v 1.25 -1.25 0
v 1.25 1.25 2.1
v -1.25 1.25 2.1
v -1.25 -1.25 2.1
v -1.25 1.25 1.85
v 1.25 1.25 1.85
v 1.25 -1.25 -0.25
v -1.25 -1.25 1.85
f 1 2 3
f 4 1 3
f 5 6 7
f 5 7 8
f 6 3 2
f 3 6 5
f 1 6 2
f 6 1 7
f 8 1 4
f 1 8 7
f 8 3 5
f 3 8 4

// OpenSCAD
// file: lib/lodge_kit.scad
// Lodge shell tile kit — shared dimensions and modules.
//
// The game paints a lodge footprint in 5 m cells and resolves the
// exterior from these tiles at half-cell (2.5 m) resolution; see
// internal/world/lodge_shell.go. Every tile is authored in the same
// canonical frame:
//
//   * origin on the lodge floor plane (Z = 0);
//   * wall-type tiles sit on a footprint edge, centred on it, with the
//     OUTSIDE toward SCAD −Y (game +Z) and the wall thickness toward +Y;
//   * roof tiles are centred on a half-cell, with Z = 0 at the tile's
//     lowest corner; slopes fall toward −Y (game +Z);
//   * corner tiles sit on a grid vertex; an outer corner's building is
//     in the SCAD (−X, +Y) quadrant, an inner corner's notch in (+X, −Y).
//
// Colours are near-neutral: the renderer tints walls and roofs per lodge
// from a seeded palette (world.ShellPalette).
//
// Keep these in sync with the constants in lodge_shell.go.

tile   = 2.5;   // ShellTileSize
wall_h = 5.0;   // ShellWallHeight
rise   = 2.1;   // ShellRoofRise, per tile of run
pitch  = rise / tile;

wall_t   = 0.35;  // wall thickness
sink     = 1.5;   // walls run this far below the floor to hide pad grading
roof_t   = 0.25;  // roof slab thickness
overhang = 0.7;   // eaves overhang past the wall plane

c_wall   = [0.92, 0.90, 0.86];
c_stone  = [0.62, 0.61, 0.60];
c_trim   = [0.97, 0.97, 0.95];
c_glass  = [0.30, 0.42, 0.52];
c_door   = [0.36, 0.25, 0.18];
c_roof   = [0.97, 0.97, 0.97];
c_fascia = [0.55, 0.52, 0.50];

// Plain wall panel: timber above a stone plinth, a trim band under the
// eaves.
module wall_panel() {
    color(c_wall)
        translate([-tile/2, 0, -sink]) cube([tile, wall_t, wall_h + sink]);
    color(c_stone)
        translate([-tile/2, -0.06, -sink]) cube([tile, wall_t, sink + 0.7]);
    color(c_trim)
        translate([-tile/2, -0.04, wall_h - 0.3]) cube([tile, 0.1, 0.3]);
    battens();
}

// Horizontal board lines above the plinth.
module battens() {
    color(c_wall * 0.8)
        for (z = [1.3 : 0.6 : wall_h - 0.6])
            translate([-tile/2, -0.03, z]) cube([tile, 0.04, 0.06]);
}

// A framed pane on the outer face. x0/w along the wall, z0/h up it.
module pane(x0, w, z0, h) {
    color(c_trim)
        translate([x0 - 0.1, -0.05, z0 - 0.1]) cube([w + 0.2, 0.06, h + 0.2]);
    color(c_glass)
        translate([x0, -0.08, z0]) cube([w, 0.06, h]);
}

module wall_window() {
    wall_panel();
    pane(-0.7, 1.4, 1.4, 2.2);
    color(c_trim) translate([-0.02, -0.1, 1.4]) cube([0.04, 0.04, 2.2]); // mullion
}

// Tall window flanked by shutters.
module wall_window_alt() {
    wall_panel();
    pane(-0.5, 1.0, 1.2, 2.8);
    color(c_door) {
        translate([-1.0, -0.1, 1.2]) cube([0.4, 0.05, 2.8]);
        translate([ 0.6, -0.1, 1.2]) cube([0.4, 0.05, 2.8]);
    }
}

// Floor-to-eave glazing for food courts: a low stone sill, then glass in
// three lights.
module wall_glazed() {
    color(c_wall)
        translate([-tile/2, 0, -sink]) cube([tile, wall_t, wall_h + sink]);
    color(c_stone)
        translate([-tile/2, -0.06, -sink]) cube([tile, wall_t, sink + 0.35]);
    color(c_glass)
        translate([-tile/2, -0.09, 0.35]) cube([tile, 0.06, wall_h - 0.75]);
    color(c_trim) {
        for (x = [-tile/2, -tile/6, tile/6, tile/2 - 0.08])
            translate([x, -0.12, 0.35]) cube([0.08, 0.06, wall_h - 0.75]);
        translate([-tile/2, -0.12, wall_h - 0.45]) cube([tile, 0.07, 0.1]);
    }
}

// Glazed entry door under a small canopy, with a step.
module door() {
    color(c_wall)
        translate([-tile/2, 0, -sink]) cube([tile, wall_t, wall_h + sink]);
    color(c_stone)
        translate([-tile/2, -0.06, -sink]) cube([tile, wall_t, sink + 0.15]);
    battens();
    color(c_door)
        translate([-0.9, -0.1, 0]) cube([1.8, 0.1, 2.7]);
    color(c_glass) {
        translate([-0.75, -0.13, 0.9]) cube([0.65, 0.05, 1.6]);
        translate([ 0.10, -0.13, 0.9]) cube([0.65, 0.05, 1.6]);
    }
    color(c_trim)
        translate([-tile/2, -0.04, wall_h - 0.3]) cube([tile, 0.1, 0.3]);
    color(c_roof)   // canopy
        translate([-1.2, -1.3, 3.0])
            rotate([-12, 0, 0]) cube([2.4, 1.3, 0.12]);
    color(c_stone)  // step
        translate([-1.1, -0.9, -0.3]) cube([2.2, 0.9, 0.42]);
}

module corner_outer() {
    color(c_stone)
        translate([-0.3, -0.05, -sink]) cube([0.35, 0.35, wall_h + sink - 0.3]);
}

module corner_inner() {
    color(c_trim)
        translate([0, -0.12, 0]) cube([0.12, 0.12, wall_h - 0.3]);
}

// Roof slab over one half-cell. h lists corner heights (in rise units)
// in SCAD order (−X,+Y), (+X,+Y), (+X,−Y), (−X,−Y); split names which
// diagonal the top surface folds along: 0 through corners 0–2, 1
// through corners 1–3.
module roof_tile(h, split) {
    p = [[-tile/2, tile/2], [tile/2, tile/2], [tile/2, -tile/2], [-tile/2, -tile/2]];
    top = [for (i = [0:3]) [p[i][0], p[i][1], h[i] * rise]];
    bot = [for (i = [0:3]) [p[i][0], p[i][1], h[i] * rise - roof_t]];
    tris = split == 0 ? [[0, 1, 2], [0, 2, 3]] : [[0, 1, 3], [1, 2, 3]];
    color(c_roof)
        polyhedron(
            points = concat(top, bot),
            faces = concat(
                // top (clockwise seen from above = outward in OpenSCAD)
                [for (t = tris) [t[0], t[1], t[2]]],
                [for (t = tris) [t[2] + 4, t[1] + 4, t[0] + 4]],
                [for (i = [0:3]) [i, i + 4, (i + 1) % 4 + 4, (i + 1) % 4]]
            ));
}

// Eaves strip past a wall edge: continues the roof plane outward and
// down, finished with a fascia board.
module eave() {
    drop = overhang * pitch;
    color(c_roof)
        polyhedron(
            points = [
                [-tile/2, 0, 0], [tile/2, 0, 0], [tile/2, -overhang, -drop], [-tile/2, -overhang, -drop],
                [-tile/2, 0, -roof_t], [tile/2, 0, -roof_t], [tile/2, -overhang, -drop - roof_t], [-tile/2, -overhang, -drop - roof_t],
            ],
            faces = [[0, 1, 2, 3], [7, 6, 5, 4], [0, 4, 5, 1], [1, 5, 6, 2], [2, 6, 7, 3], [3, 7, 4, 0]]);
    color(c_fascia)
        translate([-tile/2, -overhang - 0.05, -drop - roof_t - 0.1]) cube([tile, 0.08, roof_t + 0.2]);
}

// Eaves in the square past an outer corner: a hip folding along the
// diagonal away from the building.
module eave_corner() {
    o = overhang;
    d = o * pitch;
    color(c_roof)
        polyhedron(
            points = [
                [0, 0, 0], [o, 0, -d], [o, -o, -d], [0, -o, -d],
                [0, 0, -roof_t], [o, 0, -d - roof_t], [o, -o, -d - roof_t], [0, -o, -d - roof_t],
            ],
            faces = [[0, 1, 2], [0, 2, 3], [6, 5, 4], [7, 6, 4], [0, 4, 5, 1], [1, 5, 6, 2], [2, 6, 7, 3], [3, 7, 4, 0]]);
    color(c_fascia) {
        translate([0, -o - 0.05, -d - roof_t - 0.1]) cube([o + 0.05, 0.08, roof_t + 0.2]);
        translate([o - 0.03, -o - 0.05, -d - roof_t - 0.1]) cube([0.08, o + 0.05, roof_t + 0.2]);
    }
}

module chimney() {
    color(c_stone)
        translate([-0.55, -0.55, -1.0]) cube([1.1, 1.1, rise + 3.0]);
    color(c_fascia)
        translate([-0.65, -0.65, rise + 1.8]) cube([1.3, 1.3, 0.2]);
}
// main file
// Lodge shell kit: valley, dipping at the (+X, −Y) corner. See lib/lodge_kit.scad.
include <lib/lodge_kit.scad>
roof_tile([1, 1, 0, 1], 0);
